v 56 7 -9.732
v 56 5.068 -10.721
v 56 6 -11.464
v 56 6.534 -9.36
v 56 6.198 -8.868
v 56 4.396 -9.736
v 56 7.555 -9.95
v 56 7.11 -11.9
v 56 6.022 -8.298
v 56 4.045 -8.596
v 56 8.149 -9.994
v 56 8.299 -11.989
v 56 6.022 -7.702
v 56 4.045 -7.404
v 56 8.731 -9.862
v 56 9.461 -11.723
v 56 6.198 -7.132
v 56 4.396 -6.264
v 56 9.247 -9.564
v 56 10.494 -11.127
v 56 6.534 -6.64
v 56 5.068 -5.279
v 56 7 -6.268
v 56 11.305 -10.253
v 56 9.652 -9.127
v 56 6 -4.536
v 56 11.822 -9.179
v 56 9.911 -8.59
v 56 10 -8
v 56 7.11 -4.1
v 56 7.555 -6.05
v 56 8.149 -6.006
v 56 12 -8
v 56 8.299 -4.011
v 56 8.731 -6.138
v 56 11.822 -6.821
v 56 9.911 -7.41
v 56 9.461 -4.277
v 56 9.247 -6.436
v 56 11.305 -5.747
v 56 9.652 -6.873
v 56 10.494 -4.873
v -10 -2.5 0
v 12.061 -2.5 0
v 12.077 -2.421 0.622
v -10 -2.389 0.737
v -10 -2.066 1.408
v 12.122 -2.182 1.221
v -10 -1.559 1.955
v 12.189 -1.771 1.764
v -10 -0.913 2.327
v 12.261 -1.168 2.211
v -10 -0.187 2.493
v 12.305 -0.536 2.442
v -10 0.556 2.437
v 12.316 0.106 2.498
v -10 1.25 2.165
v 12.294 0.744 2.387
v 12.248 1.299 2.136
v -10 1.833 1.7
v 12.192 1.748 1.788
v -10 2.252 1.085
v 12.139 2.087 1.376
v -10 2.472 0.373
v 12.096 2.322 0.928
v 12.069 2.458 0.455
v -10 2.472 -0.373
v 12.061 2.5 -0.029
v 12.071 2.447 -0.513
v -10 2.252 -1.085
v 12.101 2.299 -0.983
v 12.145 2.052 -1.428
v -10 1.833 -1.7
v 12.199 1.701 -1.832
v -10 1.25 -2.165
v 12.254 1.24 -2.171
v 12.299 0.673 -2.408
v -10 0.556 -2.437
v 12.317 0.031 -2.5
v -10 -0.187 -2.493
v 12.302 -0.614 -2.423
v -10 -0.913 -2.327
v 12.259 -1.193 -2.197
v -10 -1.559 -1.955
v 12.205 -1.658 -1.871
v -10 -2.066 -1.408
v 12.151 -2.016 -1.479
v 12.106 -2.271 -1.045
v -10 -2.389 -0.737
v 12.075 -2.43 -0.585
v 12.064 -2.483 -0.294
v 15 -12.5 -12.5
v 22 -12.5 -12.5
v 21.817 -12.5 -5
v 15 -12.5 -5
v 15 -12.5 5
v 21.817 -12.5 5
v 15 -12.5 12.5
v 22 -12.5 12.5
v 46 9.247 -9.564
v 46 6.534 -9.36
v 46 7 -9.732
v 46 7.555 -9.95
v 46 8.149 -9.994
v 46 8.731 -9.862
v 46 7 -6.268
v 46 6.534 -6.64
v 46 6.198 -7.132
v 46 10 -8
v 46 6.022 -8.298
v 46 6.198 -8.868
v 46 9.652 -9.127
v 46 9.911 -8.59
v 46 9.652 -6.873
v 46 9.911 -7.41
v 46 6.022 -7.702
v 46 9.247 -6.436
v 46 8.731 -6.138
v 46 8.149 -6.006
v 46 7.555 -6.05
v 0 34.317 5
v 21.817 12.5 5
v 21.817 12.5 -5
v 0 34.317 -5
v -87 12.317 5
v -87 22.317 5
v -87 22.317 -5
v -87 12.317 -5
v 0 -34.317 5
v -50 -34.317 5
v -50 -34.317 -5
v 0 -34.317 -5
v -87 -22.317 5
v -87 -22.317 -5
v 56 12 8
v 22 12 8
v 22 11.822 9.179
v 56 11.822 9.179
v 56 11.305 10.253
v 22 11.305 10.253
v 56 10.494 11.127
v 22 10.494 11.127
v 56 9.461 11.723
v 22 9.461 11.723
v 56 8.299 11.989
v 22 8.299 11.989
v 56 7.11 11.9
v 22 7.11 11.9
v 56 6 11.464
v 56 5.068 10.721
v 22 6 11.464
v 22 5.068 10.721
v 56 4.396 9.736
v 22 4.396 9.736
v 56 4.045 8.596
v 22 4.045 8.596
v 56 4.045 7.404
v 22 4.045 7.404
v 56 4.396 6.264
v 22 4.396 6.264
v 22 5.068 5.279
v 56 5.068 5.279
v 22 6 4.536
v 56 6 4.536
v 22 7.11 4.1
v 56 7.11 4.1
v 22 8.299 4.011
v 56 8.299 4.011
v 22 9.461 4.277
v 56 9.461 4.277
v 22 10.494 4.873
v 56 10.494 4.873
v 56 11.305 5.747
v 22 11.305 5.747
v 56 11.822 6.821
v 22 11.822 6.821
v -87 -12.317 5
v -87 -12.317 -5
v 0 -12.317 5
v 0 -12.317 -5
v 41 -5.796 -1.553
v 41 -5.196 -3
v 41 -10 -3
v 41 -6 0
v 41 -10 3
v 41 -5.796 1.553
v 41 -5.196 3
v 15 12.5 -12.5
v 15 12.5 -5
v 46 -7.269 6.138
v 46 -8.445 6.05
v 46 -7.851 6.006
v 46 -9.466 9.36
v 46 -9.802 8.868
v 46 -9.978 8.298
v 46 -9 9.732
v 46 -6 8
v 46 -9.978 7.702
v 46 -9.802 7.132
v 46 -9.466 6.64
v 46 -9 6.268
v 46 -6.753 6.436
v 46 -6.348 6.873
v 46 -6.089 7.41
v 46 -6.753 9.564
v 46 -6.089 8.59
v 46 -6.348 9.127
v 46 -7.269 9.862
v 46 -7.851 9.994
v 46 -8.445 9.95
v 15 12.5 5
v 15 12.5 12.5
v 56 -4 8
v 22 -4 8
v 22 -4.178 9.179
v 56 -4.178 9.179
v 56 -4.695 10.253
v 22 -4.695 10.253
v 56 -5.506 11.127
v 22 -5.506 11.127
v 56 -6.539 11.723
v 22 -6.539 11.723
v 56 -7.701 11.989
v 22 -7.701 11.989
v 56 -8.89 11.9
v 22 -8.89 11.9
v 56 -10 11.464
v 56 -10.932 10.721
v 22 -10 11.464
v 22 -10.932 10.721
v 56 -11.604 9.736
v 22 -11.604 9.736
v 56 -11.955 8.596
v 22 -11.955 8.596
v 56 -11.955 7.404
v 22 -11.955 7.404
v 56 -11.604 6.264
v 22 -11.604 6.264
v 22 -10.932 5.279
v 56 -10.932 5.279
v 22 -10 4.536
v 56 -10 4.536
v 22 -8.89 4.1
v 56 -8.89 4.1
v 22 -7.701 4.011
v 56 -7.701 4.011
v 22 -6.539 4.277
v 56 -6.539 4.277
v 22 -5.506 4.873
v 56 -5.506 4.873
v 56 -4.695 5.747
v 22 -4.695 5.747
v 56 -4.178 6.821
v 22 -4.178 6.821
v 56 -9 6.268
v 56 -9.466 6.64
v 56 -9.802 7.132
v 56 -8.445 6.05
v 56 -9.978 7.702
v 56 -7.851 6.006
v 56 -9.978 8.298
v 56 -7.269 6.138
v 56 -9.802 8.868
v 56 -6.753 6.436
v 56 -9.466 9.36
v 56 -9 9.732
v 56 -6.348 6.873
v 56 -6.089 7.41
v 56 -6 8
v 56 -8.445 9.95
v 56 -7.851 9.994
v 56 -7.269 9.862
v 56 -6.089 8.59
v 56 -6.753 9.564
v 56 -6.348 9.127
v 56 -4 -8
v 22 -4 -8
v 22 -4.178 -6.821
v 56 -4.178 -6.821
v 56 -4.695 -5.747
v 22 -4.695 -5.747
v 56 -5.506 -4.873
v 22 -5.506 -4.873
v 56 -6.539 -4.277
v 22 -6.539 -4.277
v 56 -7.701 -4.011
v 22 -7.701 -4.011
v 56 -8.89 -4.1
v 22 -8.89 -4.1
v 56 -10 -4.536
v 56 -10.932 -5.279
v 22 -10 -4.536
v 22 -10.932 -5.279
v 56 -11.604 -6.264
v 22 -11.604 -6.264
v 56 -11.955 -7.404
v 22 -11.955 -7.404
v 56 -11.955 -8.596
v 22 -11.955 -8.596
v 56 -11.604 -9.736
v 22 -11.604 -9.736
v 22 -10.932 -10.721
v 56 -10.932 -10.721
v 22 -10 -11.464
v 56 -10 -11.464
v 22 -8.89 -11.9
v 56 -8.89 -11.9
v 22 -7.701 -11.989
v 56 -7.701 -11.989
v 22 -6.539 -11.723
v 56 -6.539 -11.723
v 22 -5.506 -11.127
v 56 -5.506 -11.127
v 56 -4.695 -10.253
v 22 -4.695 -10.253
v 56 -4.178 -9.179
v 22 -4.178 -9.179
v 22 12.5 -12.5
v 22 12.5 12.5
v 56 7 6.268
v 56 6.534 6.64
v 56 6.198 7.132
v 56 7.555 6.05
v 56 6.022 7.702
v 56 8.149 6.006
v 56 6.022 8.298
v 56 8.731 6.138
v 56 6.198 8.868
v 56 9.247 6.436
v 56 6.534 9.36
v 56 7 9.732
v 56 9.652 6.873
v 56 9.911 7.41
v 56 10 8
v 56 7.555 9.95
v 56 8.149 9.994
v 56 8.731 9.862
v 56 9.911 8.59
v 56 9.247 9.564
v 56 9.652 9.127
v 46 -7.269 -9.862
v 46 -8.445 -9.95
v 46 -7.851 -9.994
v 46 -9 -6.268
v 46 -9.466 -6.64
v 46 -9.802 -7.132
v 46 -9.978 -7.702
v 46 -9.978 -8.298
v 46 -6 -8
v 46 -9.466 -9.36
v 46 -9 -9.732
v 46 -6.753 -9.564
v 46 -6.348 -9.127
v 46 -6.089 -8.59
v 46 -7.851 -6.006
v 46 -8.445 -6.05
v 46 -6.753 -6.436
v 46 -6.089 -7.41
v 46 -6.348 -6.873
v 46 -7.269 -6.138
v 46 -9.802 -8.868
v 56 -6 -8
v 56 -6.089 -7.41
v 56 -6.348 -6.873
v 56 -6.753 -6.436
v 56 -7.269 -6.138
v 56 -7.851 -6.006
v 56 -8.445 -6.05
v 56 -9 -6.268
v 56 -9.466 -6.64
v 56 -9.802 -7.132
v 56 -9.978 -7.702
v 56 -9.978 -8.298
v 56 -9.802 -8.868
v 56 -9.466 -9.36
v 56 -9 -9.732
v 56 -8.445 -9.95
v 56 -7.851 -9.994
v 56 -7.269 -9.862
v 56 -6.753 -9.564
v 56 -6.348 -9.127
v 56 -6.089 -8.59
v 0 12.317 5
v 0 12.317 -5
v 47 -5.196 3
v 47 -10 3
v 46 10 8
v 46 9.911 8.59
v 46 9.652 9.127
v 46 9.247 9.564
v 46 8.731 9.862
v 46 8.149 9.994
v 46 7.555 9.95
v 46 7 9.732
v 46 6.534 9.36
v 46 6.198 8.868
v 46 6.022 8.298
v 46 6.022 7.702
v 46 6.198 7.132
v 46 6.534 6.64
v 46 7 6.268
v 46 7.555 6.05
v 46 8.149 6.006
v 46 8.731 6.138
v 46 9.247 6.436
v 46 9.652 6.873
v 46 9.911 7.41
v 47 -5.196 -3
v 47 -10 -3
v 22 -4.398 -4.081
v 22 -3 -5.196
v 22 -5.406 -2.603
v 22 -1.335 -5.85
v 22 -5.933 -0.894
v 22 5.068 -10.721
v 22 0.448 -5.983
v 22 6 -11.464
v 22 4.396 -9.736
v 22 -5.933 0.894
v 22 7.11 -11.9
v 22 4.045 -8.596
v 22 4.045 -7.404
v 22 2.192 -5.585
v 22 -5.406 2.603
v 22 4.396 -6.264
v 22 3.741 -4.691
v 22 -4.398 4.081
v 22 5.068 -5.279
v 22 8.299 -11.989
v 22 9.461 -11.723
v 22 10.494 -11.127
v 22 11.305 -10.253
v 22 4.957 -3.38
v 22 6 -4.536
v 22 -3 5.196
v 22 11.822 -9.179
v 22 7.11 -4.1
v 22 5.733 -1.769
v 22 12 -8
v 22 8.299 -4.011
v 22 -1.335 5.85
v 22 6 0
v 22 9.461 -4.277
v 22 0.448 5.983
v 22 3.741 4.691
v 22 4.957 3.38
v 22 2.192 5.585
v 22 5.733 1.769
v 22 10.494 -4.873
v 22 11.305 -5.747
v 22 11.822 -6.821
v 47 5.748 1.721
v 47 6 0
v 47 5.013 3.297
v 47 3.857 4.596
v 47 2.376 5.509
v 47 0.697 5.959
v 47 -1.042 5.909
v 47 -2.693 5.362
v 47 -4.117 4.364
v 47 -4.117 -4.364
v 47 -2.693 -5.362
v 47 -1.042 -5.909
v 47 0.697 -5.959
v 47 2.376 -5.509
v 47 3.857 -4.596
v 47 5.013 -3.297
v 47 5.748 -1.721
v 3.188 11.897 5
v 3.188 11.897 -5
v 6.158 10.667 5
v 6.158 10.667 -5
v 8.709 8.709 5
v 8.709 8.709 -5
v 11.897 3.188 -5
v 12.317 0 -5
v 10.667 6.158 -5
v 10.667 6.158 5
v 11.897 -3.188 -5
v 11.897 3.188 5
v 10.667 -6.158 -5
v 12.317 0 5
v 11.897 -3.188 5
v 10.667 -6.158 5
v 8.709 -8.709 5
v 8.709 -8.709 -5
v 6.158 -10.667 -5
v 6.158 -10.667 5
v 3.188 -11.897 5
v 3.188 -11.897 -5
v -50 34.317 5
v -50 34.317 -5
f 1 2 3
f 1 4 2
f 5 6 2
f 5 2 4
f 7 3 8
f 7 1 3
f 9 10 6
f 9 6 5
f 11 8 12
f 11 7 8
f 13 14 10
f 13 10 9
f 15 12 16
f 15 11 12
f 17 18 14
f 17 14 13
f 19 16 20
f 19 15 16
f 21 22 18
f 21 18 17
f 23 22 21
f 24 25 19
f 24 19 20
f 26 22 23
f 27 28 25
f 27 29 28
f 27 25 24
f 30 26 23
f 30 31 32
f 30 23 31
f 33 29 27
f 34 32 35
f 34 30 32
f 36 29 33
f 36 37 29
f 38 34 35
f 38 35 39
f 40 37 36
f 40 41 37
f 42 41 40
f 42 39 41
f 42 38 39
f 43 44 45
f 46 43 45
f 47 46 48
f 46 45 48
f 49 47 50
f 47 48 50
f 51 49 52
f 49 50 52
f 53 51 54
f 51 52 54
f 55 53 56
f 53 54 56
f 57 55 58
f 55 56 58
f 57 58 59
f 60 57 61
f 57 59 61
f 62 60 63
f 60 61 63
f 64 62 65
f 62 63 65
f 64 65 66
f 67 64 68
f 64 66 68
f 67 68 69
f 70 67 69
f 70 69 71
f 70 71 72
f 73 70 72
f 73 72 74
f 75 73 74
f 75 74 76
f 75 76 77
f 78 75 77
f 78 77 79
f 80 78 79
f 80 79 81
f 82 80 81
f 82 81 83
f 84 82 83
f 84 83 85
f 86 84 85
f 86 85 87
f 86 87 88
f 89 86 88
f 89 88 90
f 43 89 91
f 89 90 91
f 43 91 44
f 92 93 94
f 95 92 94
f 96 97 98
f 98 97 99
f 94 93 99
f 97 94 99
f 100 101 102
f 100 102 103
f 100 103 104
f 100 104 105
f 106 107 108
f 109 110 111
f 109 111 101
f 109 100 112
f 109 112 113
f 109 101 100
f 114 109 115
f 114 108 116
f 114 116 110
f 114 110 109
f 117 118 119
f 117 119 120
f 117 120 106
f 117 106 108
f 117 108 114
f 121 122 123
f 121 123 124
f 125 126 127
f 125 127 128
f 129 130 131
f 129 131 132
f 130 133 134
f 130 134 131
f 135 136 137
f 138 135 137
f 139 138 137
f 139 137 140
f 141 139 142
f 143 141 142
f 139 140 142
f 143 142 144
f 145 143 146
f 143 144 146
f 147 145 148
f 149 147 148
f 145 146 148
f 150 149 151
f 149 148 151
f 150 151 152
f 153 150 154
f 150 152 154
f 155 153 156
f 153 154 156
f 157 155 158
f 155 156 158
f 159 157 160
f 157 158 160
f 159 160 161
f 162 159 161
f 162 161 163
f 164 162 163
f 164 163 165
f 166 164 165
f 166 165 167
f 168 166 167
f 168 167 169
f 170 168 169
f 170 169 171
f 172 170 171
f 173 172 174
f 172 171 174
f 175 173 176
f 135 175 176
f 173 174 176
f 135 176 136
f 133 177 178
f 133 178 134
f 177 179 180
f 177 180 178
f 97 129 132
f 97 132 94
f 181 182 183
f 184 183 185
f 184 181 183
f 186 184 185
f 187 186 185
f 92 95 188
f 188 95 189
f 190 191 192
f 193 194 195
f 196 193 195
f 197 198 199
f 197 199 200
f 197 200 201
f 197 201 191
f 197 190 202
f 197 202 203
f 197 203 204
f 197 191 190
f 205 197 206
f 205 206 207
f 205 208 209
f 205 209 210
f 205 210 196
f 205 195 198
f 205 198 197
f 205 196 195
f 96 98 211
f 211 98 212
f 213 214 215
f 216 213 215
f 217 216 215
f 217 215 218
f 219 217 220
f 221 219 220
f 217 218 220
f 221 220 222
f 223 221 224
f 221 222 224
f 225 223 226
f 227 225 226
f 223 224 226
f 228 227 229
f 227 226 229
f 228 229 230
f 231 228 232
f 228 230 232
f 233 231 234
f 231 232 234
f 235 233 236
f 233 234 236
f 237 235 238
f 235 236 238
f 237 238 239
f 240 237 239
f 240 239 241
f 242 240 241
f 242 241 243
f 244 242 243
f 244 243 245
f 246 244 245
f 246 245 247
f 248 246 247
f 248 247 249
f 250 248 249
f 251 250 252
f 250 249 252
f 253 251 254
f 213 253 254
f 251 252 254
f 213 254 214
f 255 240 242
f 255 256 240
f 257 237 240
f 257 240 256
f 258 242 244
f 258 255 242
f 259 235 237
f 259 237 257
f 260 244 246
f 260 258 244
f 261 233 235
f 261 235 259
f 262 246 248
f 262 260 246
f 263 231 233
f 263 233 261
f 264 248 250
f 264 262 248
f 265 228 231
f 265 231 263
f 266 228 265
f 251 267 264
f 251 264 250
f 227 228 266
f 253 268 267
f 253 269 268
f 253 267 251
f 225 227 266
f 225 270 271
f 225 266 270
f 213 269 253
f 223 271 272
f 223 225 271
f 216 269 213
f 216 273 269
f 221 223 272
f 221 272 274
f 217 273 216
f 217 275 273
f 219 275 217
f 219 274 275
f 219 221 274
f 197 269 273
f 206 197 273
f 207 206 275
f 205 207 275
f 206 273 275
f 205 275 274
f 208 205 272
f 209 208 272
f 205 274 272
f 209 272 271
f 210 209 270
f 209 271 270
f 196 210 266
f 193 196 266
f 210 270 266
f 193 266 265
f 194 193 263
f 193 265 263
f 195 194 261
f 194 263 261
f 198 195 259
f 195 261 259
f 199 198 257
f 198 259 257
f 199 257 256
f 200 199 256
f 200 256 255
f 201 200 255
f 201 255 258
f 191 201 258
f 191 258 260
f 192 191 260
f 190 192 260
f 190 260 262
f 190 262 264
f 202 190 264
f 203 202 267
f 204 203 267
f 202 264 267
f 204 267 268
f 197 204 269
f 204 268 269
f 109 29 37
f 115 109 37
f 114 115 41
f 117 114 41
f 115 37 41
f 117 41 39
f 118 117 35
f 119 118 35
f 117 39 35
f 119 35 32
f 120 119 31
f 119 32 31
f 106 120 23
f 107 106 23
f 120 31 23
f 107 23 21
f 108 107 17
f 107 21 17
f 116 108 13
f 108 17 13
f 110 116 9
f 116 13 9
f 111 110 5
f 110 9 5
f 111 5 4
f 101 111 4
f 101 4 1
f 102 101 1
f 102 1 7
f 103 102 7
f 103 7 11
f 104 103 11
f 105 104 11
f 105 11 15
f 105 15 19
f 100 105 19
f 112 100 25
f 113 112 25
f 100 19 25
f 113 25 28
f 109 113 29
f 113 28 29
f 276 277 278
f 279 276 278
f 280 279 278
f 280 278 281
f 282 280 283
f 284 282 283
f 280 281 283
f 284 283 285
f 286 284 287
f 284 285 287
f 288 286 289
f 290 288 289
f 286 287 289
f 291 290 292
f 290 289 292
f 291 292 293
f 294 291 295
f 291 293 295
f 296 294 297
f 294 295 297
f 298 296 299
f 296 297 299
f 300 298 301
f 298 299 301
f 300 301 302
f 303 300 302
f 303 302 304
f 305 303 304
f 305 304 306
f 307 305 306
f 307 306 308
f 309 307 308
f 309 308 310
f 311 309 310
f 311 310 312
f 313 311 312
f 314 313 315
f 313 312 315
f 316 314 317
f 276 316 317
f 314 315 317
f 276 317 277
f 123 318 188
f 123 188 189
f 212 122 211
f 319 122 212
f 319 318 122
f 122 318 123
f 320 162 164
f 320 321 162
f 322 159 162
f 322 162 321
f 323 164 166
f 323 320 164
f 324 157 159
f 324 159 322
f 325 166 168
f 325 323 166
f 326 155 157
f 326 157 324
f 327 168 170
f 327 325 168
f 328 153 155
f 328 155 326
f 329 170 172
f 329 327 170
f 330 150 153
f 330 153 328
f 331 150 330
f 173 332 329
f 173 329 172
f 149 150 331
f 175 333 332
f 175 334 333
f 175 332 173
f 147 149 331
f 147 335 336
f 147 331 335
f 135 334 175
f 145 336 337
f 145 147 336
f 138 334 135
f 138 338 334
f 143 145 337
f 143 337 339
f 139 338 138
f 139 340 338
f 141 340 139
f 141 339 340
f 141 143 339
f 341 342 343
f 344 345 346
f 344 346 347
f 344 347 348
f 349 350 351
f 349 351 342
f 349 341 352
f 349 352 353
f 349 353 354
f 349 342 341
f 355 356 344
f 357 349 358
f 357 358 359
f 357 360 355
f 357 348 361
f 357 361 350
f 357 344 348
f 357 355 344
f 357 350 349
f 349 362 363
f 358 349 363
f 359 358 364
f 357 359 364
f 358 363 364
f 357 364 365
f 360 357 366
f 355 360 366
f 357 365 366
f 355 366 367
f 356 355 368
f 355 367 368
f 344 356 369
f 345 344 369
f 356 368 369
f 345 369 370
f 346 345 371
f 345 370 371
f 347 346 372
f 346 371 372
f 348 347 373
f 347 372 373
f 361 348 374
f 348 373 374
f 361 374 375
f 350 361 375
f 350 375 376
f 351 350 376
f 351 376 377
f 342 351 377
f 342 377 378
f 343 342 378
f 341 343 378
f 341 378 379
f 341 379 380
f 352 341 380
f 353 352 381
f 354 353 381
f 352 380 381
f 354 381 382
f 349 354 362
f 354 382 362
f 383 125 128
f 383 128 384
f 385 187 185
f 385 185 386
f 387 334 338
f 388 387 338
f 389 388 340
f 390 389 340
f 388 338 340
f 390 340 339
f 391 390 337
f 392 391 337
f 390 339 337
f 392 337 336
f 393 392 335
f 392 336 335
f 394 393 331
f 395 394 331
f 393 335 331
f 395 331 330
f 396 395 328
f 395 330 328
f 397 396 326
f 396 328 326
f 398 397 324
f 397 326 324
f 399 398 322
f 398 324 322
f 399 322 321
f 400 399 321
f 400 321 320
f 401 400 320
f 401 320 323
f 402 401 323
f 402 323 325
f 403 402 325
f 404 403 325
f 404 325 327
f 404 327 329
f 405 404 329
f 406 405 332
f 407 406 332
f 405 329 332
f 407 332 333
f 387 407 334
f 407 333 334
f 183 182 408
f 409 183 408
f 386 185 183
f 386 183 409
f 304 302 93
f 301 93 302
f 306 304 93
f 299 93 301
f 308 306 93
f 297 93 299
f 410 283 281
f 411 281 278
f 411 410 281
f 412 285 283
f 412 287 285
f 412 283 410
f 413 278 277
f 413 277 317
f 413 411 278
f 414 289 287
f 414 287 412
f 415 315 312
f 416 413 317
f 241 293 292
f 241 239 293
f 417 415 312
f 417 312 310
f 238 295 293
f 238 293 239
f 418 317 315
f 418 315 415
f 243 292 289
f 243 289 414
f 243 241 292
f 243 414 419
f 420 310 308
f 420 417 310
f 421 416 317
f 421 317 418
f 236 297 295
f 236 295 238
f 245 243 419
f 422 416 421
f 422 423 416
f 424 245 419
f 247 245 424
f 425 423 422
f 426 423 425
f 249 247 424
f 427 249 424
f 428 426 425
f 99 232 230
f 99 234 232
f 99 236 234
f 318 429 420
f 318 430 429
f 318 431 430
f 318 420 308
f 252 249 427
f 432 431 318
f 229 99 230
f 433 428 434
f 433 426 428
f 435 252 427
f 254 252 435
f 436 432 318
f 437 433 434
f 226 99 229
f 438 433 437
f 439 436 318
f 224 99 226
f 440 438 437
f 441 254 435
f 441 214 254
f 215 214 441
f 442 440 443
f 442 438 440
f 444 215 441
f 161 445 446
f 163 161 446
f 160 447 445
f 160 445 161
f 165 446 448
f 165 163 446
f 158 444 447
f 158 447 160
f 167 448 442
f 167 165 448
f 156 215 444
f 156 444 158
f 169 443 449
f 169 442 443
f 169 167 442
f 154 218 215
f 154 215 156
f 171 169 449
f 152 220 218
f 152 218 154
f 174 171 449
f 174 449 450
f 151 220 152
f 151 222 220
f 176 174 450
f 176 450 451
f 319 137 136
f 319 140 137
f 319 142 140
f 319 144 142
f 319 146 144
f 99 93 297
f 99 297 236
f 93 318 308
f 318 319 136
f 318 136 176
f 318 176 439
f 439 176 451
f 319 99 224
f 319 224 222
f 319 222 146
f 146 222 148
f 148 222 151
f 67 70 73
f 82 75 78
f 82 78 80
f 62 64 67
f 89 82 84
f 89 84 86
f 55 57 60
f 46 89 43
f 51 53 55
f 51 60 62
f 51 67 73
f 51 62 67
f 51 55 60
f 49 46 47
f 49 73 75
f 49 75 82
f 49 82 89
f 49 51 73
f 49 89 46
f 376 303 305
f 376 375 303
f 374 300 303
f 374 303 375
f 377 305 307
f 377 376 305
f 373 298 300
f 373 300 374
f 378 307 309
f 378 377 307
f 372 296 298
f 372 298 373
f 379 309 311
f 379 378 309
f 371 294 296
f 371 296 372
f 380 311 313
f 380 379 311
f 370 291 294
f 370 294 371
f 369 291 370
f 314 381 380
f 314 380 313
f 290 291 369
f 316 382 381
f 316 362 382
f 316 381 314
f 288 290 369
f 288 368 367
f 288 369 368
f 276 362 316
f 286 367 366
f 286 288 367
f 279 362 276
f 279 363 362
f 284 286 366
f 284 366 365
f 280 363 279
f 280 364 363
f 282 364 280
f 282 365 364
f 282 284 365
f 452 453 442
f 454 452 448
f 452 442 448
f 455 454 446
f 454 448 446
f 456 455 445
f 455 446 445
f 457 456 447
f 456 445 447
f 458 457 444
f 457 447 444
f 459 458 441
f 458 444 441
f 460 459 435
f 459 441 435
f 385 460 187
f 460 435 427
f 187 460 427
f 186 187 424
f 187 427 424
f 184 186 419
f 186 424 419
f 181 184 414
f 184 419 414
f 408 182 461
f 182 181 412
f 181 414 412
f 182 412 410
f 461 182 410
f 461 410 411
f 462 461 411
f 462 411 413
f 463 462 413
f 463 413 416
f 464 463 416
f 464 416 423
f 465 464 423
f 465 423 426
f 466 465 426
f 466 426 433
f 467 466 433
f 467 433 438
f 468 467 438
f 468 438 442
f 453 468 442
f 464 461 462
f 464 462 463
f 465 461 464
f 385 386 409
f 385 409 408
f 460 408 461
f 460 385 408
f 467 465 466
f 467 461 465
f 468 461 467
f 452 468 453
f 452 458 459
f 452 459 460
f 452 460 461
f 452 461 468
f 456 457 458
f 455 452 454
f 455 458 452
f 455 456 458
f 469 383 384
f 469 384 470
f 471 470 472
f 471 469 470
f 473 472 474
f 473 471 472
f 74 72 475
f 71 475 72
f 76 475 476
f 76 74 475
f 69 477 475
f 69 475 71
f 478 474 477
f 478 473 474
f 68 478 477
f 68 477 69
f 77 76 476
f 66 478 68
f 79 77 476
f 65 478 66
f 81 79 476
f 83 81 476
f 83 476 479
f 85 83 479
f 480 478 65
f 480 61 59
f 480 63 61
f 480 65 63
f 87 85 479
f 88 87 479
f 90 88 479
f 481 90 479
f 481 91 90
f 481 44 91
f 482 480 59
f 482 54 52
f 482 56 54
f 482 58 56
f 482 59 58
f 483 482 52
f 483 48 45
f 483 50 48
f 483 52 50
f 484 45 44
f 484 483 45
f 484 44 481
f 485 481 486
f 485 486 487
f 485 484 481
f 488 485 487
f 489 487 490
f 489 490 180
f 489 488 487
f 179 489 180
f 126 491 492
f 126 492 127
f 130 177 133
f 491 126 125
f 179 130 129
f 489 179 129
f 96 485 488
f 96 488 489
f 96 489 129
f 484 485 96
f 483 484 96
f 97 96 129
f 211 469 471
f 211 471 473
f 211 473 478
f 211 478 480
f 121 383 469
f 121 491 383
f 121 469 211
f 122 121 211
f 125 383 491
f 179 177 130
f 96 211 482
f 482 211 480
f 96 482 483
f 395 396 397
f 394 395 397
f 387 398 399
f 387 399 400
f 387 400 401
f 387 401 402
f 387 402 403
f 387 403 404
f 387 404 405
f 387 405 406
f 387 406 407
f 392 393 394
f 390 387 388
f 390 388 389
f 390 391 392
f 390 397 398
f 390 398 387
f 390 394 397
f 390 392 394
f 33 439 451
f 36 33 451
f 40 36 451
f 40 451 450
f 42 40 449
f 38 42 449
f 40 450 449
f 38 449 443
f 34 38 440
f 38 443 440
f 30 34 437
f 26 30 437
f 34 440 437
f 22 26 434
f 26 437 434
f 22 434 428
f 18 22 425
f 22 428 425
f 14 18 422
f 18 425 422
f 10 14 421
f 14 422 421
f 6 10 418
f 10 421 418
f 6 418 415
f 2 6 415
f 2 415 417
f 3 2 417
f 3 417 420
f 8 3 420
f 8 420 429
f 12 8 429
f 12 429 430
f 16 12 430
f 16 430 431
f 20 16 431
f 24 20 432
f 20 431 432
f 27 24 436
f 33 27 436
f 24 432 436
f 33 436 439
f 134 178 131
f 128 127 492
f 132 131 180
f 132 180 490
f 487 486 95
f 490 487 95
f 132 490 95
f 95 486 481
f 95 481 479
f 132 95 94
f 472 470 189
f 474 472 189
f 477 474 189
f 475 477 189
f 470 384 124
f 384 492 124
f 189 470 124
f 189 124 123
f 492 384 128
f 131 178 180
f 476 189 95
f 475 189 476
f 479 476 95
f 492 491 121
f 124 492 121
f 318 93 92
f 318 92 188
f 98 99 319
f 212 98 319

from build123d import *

# Parameters (mm, degrees)
F0_W      = 50
F0_H      = 22
F1_DEPTH  = 5
F2_W      = 25
F2_H      = 25
F3_DEPTH  = 7
F4_R      = 6
F5_DEPTH  = 25
F6_R      = 4
F7_DEPTH  = 34
F8_R      = 2
F9_DEPTH  = 10
F10_R     = 2.5
F11_DEPTH = 25
F12_W     = 6
F12_H     = 6
F13_DEPTH = 10


with BuildPart() as f1:
    # F0 (on Top) → F1 (new body, symmetric)
    with BuildSketch(Plane.XY):
        with Locations((-25, 23.3168965802)):
            Rectangle(F0_W, F0_H)
        Polygon((-50, 12.3168965802), (-50, 34.3168965802), (-87, 22.3168965802), (-87, 12.3168965802), align=None)
        Polygon((22, 12.3168965802), (0, 34.3168965802), (0, 12.3168965802), align=None)
        with BuildLine():
            Line((22, 12.3168965802), (0, 12.3168965802))
            ThreePointArc((0, 12.3168965802), (8.709361095, 8.709361095), (12.3168965802, 0))
            Line((12.3168965802, 0), (22, 0))
            Line((22, 0), (22, 12.3168965802))
        make_face()
        with BuildLine():
            Line((22, 0), (12.3168965802, 0))
            ThreePointArc((12.3168965802, 0), (8.709361095, -8.709361095), (0, -12.3168965802))
            Line((0, -12.3168965802), (22, -12.3168965802))
            Line((22, -12.3168965802), (22, 0))
        make_face()
        Polygon((22, -12.3168965802), (0, -12.3168965802), (-50, -12.3168965802), (-87, -12.3168965802), (-87, -22.3168965802), (-50, -34.3168965802), (0, -34.3168965802), align=None)
    extrude(amount=F1_DEPTH, both=True)

    # F2 (on face) → F3 (join)
    with BuildSketch(Plane.YZ.offset(22)):
        Rectangle(F2_W, F2_H)
    extrude(amount=-F3_DEPTH)

    # F4 (on face) → F5 (join)
    with BuildSketch(Plane.YZ.offset(22)):
        Circle(F4_R)
    extrude(amount=F5_DEPTH)

    # F6 (on face) → F7 (join)
    with BuildSketch(Plane.YZ.offset(22)):
        with Locations((8, 8)):
            Circle(F6_R)
        with Locations((-8, 8)):
            Circle(F6_R)
        with Locations((8, -8)):
            Circle(F6_R)
        with Locations((-8, -8)):
            Circle(F6_R)
    extrude(amount=F7_DEPTH)

    # F8 (on face) → F9 (cut)
    with BuildSketch(Plane.YZ.offset(56)):
        with Locations((8, 8)):
            Circle(F8_R)
        with Locations((-8, 8)):
            Circle(F8_R)
        with Locations((8, -8)):
            Circle(F8_R)
        with Locations((-8, -8)):
            Circle(F8_R)
    extrude(amount=-F9_DEPTH, mode=Mode.SUBTRACT)

    # F10 (on face) → F11 (join)
    with BuildSketch(Plane(origin=(15, 0, 0), x_dir=(0, -1, 0), z_dir=(-1, 0, 0))):
        Circle(F10_R)
    extrude(amount=F11_DEPTH)

    # F12 (on Front) → F13 (join)
    with BuildSketch(Plane.XZ):
        with Locations((44, 0)):
            Rectangle(F12_W, F12_H)
    extrude(amount=F13_DEPTH)


solid = f1.part
